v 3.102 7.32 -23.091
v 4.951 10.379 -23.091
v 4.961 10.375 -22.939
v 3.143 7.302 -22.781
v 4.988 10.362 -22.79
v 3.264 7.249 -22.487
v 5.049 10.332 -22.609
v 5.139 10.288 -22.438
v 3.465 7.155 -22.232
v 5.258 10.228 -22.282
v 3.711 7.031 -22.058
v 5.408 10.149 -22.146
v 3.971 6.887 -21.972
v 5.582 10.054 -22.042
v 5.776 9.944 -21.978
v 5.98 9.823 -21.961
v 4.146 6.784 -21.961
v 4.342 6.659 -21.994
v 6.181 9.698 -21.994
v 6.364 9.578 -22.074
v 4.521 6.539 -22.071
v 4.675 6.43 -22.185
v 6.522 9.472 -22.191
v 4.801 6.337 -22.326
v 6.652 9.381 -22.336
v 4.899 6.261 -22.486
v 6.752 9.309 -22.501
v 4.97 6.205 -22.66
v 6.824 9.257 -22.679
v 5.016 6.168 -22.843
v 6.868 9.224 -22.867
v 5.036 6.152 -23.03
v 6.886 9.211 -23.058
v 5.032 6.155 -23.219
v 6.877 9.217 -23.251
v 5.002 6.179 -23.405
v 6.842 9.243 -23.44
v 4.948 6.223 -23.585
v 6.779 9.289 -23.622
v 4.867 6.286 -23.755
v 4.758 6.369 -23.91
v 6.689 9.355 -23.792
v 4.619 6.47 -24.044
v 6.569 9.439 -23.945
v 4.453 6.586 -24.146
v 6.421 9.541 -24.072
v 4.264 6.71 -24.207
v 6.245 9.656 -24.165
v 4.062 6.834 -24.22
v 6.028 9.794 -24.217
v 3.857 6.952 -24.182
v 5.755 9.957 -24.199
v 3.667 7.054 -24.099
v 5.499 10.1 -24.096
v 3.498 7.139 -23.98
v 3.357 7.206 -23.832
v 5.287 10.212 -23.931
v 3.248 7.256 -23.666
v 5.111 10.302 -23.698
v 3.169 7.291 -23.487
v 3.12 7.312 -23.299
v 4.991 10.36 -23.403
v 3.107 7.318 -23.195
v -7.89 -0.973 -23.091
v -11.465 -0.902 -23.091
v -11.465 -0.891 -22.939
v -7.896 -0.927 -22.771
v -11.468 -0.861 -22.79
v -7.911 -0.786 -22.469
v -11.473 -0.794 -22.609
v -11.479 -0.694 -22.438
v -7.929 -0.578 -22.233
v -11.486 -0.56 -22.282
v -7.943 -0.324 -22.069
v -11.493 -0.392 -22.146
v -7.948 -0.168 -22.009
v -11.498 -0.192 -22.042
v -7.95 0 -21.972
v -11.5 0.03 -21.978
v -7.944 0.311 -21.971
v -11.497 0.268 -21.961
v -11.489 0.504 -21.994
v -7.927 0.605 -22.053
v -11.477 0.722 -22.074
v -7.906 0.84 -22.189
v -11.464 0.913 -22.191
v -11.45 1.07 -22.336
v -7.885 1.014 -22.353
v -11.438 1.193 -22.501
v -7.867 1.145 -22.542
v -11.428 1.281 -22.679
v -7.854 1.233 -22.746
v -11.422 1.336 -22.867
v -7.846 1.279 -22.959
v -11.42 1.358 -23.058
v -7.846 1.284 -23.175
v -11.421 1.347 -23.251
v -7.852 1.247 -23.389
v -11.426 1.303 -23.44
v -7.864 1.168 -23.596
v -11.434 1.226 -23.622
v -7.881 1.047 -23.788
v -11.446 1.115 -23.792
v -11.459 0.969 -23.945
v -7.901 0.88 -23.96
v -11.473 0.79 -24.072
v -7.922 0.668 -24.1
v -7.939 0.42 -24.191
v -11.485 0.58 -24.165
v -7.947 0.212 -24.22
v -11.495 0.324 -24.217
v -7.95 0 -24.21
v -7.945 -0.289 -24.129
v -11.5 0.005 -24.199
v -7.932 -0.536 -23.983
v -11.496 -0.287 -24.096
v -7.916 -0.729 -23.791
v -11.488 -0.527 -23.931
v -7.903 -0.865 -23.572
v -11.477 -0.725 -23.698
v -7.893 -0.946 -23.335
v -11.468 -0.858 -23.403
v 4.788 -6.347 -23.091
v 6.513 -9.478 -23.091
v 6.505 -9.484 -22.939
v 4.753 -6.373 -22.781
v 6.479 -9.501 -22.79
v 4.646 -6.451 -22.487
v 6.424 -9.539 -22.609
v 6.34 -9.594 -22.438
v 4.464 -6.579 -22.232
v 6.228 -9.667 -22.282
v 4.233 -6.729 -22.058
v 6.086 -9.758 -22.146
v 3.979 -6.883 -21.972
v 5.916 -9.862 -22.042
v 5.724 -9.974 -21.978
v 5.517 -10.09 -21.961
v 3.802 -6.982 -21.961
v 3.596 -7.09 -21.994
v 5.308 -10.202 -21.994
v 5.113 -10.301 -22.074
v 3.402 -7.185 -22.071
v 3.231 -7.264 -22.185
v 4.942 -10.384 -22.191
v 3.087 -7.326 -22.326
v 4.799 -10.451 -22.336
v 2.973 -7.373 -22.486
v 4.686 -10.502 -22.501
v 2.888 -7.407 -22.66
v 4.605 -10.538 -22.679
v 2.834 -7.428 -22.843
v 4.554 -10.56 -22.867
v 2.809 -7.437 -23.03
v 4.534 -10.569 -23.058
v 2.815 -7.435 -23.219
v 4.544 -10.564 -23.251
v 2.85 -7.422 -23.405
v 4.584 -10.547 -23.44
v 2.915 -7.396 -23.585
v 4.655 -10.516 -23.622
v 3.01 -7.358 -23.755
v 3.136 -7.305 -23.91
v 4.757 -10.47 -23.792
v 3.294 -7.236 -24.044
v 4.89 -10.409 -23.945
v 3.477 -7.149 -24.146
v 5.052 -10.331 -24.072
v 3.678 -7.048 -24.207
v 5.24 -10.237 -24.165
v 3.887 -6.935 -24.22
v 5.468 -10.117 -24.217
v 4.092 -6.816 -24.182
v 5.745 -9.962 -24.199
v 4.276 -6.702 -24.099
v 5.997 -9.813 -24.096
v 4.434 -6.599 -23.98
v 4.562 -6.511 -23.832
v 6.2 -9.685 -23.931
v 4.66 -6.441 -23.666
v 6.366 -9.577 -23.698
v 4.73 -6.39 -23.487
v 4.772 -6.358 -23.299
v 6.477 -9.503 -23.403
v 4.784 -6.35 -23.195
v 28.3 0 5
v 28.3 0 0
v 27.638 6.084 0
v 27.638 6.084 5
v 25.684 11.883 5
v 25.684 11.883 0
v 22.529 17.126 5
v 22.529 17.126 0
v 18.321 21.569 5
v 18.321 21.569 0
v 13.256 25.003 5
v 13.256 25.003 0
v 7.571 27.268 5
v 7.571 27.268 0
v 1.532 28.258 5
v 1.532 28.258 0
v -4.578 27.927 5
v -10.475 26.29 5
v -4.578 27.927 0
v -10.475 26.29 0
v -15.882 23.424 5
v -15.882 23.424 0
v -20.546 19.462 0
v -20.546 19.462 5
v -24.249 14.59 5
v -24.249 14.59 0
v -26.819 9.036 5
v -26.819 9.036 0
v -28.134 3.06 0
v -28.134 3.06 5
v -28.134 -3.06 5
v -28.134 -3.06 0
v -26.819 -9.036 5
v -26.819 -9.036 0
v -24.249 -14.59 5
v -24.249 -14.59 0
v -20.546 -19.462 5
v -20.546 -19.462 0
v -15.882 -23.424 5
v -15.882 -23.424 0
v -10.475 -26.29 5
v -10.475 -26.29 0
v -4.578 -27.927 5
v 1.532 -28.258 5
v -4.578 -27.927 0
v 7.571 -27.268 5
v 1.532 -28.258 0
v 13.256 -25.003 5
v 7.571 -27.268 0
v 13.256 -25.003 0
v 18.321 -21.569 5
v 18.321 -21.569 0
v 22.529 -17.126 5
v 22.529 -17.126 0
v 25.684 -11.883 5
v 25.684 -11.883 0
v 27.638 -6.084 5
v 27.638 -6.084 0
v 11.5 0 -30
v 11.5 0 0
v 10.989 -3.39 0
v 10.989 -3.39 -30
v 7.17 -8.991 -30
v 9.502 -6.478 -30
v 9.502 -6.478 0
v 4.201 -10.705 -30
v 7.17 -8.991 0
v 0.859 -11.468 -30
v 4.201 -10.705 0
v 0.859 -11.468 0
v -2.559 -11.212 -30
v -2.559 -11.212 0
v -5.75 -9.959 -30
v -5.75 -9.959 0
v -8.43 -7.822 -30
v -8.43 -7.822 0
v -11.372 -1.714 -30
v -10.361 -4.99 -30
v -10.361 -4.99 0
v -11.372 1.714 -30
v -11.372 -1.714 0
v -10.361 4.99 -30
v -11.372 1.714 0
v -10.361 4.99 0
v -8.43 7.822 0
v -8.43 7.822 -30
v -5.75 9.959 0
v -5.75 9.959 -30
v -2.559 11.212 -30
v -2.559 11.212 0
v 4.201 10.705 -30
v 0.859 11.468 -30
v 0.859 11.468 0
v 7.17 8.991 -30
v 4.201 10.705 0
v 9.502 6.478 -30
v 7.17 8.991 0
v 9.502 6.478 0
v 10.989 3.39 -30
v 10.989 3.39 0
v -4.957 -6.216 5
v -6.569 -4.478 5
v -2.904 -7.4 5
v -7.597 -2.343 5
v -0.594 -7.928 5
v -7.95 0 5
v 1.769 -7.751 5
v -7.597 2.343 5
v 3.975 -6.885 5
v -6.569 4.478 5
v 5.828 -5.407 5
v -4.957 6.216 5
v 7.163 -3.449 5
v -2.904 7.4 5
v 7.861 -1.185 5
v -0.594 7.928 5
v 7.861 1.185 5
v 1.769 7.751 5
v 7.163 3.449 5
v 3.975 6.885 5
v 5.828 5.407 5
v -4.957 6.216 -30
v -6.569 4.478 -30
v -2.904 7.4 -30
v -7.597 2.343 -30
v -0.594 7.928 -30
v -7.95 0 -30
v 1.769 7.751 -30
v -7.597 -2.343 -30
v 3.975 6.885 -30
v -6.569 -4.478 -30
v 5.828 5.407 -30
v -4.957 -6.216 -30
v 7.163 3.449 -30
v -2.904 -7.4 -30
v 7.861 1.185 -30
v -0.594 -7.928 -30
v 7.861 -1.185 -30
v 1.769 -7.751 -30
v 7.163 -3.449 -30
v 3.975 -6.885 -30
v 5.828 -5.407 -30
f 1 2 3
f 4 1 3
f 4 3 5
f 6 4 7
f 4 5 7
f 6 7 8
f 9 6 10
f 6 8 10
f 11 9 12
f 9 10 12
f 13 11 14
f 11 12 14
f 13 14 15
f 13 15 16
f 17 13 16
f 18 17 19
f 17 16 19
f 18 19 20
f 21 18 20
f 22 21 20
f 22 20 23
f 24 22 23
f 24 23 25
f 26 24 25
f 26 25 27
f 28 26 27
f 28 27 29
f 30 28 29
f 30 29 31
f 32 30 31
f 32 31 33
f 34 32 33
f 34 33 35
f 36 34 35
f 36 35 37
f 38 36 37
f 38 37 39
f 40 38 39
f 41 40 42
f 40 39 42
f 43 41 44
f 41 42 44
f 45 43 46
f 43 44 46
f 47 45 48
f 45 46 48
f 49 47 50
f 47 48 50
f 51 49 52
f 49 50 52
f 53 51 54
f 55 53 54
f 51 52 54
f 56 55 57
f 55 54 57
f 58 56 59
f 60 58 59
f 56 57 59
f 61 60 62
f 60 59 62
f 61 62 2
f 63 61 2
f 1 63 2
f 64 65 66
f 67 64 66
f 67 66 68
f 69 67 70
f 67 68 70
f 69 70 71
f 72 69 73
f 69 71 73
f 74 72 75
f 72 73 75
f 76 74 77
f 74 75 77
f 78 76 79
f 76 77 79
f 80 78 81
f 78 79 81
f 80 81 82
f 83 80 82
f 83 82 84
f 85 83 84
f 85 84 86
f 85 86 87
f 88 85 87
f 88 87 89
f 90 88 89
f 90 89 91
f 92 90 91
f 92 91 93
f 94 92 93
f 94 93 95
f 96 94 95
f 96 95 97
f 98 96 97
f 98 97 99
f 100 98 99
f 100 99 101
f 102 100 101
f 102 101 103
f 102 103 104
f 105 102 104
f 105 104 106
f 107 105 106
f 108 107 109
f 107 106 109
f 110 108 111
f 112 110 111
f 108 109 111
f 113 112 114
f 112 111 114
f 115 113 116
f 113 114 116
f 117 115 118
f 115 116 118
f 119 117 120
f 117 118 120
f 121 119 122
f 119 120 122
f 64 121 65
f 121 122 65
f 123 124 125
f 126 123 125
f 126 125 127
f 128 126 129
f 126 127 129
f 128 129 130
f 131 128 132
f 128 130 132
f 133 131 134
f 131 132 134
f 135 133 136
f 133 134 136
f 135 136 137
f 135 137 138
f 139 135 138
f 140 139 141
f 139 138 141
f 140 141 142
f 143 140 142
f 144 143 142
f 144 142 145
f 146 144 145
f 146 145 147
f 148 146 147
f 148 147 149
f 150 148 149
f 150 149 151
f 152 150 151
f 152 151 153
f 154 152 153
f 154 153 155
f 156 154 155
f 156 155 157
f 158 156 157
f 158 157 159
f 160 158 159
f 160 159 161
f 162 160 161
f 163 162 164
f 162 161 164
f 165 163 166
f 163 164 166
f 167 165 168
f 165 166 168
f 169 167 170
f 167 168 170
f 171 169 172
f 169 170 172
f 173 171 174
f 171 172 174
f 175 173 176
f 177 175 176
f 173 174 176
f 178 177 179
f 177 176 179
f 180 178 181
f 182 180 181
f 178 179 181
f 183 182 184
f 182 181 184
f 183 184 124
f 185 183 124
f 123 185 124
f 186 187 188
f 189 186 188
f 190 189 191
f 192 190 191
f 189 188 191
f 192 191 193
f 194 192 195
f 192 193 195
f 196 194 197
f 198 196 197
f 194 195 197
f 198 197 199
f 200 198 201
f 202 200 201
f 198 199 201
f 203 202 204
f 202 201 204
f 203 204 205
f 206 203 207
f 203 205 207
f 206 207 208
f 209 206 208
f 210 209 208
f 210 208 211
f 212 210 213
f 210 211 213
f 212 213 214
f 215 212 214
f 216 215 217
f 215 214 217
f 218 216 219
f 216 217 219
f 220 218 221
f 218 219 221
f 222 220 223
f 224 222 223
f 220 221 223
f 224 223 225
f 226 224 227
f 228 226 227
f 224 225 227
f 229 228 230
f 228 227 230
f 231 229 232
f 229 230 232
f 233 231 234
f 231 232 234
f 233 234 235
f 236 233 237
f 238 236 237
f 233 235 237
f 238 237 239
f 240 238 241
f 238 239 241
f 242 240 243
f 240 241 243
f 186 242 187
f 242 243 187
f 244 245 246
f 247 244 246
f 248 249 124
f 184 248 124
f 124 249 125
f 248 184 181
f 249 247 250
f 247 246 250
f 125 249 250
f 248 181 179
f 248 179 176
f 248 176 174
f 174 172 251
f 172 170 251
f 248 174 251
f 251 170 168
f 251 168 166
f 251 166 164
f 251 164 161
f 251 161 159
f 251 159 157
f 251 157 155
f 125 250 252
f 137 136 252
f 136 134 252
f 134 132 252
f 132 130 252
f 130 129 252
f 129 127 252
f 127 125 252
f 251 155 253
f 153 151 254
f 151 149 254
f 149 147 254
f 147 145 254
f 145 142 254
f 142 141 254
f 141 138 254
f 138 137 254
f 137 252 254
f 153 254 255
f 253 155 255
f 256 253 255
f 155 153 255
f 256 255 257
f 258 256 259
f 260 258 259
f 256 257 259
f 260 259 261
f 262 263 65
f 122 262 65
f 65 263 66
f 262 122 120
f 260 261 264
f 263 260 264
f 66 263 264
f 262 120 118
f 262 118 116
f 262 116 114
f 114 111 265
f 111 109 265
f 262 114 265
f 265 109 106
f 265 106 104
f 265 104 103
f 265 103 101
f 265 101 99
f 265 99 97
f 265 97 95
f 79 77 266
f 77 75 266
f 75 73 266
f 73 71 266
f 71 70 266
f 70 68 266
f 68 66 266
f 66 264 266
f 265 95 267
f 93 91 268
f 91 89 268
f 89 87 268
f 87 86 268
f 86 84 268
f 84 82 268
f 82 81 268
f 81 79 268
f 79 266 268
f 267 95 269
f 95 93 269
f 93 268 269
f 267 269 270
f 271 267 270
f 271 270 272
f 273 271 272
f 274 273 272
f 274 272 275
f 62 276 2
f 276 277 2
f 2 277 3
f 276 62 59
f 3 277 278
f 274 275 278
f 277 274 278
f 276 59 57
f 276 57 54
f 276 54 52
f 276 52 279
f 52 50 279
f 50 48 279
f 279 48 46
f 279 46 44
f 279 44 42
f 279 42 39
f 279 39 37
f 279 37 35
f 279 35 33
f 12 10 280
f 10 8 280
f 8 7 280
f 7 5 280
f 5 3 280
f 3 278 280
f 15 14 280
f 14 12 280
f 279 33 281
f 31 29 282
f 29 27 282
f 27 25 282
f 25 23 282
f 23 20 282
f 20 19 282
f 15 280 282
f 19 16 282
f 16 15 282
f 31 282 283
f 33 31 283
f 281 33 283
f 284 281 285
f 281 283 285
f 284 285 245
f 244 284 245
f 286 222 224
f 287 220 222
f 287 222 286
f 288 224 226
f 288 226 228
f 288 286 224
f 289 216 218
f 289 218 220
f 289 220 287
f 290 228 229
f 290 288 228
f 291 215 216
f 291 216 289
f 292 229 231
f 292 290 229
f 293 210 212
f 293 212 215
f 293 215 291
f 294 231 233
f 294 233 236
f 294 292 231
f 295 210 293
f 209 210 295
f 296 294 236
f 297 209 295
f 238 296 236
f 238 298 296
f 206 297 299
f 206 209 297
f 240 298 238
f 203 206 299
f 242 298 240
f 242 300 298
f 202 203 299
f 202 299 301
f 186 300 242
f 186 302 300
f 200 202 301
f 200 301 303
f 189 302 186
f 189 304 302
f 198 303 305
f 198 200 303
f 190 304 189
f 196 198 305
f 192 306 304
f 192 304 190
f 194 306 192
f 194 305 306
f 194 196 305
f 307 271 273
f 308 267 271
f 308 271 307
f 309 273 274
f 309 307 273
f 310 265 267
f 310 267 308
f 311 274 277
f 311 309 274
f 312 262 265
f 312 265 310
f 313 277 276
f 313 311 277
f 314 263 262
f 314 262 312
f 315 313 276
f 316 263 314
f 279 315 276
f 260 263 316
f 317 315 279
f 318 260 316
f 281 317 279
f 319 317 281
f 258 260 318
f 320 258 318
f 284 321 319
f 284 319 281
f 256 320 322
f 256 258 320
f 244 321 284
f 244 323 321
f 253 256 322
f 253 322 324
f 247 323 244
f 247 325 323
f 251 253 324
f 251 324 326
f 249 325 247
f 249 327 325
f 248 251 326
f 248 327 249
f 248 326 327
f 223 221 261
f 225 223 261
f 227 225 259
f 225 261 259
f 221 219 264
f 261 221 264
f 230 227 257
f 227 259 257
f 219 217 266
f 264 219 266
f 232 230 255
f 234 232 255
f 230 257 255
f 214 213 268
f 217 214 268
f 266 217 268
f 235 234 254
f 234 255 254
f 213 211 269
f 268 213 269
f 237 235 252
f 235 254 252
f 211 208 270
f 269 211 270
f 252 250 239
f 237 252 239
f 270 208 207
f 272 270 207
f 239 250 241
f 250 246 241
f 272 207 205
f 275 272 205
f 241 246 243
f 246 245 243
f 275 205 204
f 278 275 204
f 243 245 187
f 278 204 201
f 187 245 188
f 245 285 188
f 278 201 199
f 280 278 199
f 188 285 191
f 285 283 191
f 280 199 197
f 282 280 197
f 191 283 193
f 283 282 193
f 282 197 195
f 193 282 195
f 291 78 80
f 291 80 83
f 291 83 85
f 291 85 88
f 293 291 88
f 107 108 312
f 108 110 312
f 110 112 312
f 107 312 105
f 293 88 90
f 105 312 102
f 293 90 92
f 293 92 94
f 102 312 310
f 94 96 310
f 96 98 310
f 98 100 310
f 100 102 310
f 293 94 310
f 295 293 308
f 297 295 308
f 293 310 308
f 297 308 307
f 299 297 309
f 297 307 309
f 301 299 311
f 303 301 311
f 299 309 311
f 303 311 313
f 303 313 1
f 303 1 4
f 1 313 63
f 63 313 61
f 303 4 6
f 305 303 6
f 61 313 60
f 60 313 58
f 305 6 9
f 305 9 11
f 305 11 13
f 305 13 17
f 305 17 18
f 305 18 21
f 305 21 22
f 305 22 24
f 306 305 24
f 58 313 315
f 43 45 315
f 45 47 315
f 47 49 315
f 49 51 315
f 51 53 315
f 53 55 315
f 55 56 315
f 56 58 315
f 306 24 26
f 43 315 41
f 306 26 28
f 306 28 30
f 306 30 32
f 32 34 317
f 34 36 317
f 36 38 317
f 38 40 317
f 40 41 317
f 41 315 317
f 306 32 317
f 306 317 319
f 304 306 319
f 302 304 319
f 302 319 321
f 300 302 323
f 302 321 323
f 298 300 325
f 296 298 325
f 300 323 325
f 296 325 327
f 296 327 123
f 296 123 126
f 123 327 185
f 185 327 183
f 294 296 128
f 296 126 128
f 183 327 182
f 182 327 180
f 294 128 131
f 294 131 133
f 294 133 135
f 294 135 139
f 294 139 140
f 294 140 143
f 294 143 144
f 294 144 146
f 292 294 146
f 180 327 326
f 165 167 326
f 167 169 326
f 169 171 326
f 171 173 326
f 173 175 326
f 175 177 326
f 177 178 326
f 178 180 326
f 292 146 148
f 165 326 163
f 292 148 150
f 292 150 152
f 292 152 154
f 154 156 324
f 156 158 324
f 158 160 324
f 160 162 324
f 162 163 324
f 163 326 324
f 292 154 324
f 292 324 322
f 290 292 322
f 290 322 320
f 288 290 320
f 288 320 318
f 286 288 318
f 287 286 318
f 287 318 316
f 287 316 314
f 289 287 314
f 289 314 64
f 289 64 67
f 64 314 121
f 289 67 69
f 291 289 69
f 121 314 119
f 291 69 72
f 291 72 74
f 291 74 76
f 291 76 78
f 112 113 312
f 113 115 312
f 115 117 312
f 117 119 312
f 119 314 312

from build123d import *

# Parameters (mm, degrees)
SKETCH1_R                  = 28.3
BOSS_EXTRUDE1_DEPTH        = 5
SKETCH4_R                  = 11.5
BOSS_EXTRUDE2_DEPTH        = 30
SKETCH10_R                 = 7.95
CUT_EXTRUDE4_DEPTH         = 36
F_4_40_TAPPED_HOLE2_REACH  = 42.359
F_4_40_TAPPED_HOLE2_BORE_R = 1.1303
CIRPATTERN3_COUNT          = 3


with BuildPart() as part:
    # Sketch1 → Boss-Extrude1 (new body)
    with BuildSketch(Plane.XY):
        Circle(SKETCH1_R)
    extrude(amount=BOSS_EXTRUDE1_DEPTH)

    # Sketch4 → Boss-Extrude2 (add)
    with BuildSketch(Plane(origin=(0, 0, 0), x_dir=(-1, 0, 0), z_dir=(0, 0, -1))):
        with Locations(Location((0, 0, 0), (0, 0, 180))):  # turned: the seam where the file's is
            Circle(SKETCH4_R)
    extrude(amount=BOSS_EXTRUDE2_DEPTH)

    # Sketch10 → Cut-Extrude4 (cut, through all)
    with BuildSketch(Plane(origin=(0, 0, -30), x_dir=(-1, 0, 0), z_dir=(0, 0, -1))):
        Circle(SKETCH10_R)
    extrude(amount=-CUT_EXTRUDE4_DEPTH, mode=Mode.SUBTRACT)

    # #4-40 Tapped Hole2 bore (on position points) → #4-40 Tapped Hole2 (cut, up to next)
    with BuildSketch(Plane(origin=(-11.49770937, 0.22951958, -23.090859569), x_dir=(-0.019958224, -0.999800815, 0), z_dir=(-0.999800815, 0.019958224, 0)), mode=Mode.PRIVATE) as f_4_40_tapped_hole2_sk1:
        Circle(F_4_40_TAPPED_HOLE2_BORE_R)
    f_4_40_tapped_hole2_tool1 = extrude(f_4_40_tapped_hole2_sk1.sketch, amount=-F_4_40_TAPPED_HOLE2_REACH, mode=Mode.PRIVATE) & part.part
    f_4_40_tapped_hole2 = f_4_40_tapped_hole2_tool1.solids().sort_by_distance((-11.497709, 0.22952, -23.09086))[0]
    add(f_4_40_tapped_hole2, mode=Mode.SUBTRACT)

    # CirPattern3: #4-40 Tapped Hole2 ×3 about axis
    cirpattern3_axis = Axis((0, 0, -30), (0, 0, 1))
    for i in range(1, CIRPATTERN3_COUNT):
        add(f_4_40_tapped_hole2.rotate(cirpattern3_axis, i * 360 / CIRPATTERN3_COUNT), mode=Mode.SUBTRACT)


solid = part.part
